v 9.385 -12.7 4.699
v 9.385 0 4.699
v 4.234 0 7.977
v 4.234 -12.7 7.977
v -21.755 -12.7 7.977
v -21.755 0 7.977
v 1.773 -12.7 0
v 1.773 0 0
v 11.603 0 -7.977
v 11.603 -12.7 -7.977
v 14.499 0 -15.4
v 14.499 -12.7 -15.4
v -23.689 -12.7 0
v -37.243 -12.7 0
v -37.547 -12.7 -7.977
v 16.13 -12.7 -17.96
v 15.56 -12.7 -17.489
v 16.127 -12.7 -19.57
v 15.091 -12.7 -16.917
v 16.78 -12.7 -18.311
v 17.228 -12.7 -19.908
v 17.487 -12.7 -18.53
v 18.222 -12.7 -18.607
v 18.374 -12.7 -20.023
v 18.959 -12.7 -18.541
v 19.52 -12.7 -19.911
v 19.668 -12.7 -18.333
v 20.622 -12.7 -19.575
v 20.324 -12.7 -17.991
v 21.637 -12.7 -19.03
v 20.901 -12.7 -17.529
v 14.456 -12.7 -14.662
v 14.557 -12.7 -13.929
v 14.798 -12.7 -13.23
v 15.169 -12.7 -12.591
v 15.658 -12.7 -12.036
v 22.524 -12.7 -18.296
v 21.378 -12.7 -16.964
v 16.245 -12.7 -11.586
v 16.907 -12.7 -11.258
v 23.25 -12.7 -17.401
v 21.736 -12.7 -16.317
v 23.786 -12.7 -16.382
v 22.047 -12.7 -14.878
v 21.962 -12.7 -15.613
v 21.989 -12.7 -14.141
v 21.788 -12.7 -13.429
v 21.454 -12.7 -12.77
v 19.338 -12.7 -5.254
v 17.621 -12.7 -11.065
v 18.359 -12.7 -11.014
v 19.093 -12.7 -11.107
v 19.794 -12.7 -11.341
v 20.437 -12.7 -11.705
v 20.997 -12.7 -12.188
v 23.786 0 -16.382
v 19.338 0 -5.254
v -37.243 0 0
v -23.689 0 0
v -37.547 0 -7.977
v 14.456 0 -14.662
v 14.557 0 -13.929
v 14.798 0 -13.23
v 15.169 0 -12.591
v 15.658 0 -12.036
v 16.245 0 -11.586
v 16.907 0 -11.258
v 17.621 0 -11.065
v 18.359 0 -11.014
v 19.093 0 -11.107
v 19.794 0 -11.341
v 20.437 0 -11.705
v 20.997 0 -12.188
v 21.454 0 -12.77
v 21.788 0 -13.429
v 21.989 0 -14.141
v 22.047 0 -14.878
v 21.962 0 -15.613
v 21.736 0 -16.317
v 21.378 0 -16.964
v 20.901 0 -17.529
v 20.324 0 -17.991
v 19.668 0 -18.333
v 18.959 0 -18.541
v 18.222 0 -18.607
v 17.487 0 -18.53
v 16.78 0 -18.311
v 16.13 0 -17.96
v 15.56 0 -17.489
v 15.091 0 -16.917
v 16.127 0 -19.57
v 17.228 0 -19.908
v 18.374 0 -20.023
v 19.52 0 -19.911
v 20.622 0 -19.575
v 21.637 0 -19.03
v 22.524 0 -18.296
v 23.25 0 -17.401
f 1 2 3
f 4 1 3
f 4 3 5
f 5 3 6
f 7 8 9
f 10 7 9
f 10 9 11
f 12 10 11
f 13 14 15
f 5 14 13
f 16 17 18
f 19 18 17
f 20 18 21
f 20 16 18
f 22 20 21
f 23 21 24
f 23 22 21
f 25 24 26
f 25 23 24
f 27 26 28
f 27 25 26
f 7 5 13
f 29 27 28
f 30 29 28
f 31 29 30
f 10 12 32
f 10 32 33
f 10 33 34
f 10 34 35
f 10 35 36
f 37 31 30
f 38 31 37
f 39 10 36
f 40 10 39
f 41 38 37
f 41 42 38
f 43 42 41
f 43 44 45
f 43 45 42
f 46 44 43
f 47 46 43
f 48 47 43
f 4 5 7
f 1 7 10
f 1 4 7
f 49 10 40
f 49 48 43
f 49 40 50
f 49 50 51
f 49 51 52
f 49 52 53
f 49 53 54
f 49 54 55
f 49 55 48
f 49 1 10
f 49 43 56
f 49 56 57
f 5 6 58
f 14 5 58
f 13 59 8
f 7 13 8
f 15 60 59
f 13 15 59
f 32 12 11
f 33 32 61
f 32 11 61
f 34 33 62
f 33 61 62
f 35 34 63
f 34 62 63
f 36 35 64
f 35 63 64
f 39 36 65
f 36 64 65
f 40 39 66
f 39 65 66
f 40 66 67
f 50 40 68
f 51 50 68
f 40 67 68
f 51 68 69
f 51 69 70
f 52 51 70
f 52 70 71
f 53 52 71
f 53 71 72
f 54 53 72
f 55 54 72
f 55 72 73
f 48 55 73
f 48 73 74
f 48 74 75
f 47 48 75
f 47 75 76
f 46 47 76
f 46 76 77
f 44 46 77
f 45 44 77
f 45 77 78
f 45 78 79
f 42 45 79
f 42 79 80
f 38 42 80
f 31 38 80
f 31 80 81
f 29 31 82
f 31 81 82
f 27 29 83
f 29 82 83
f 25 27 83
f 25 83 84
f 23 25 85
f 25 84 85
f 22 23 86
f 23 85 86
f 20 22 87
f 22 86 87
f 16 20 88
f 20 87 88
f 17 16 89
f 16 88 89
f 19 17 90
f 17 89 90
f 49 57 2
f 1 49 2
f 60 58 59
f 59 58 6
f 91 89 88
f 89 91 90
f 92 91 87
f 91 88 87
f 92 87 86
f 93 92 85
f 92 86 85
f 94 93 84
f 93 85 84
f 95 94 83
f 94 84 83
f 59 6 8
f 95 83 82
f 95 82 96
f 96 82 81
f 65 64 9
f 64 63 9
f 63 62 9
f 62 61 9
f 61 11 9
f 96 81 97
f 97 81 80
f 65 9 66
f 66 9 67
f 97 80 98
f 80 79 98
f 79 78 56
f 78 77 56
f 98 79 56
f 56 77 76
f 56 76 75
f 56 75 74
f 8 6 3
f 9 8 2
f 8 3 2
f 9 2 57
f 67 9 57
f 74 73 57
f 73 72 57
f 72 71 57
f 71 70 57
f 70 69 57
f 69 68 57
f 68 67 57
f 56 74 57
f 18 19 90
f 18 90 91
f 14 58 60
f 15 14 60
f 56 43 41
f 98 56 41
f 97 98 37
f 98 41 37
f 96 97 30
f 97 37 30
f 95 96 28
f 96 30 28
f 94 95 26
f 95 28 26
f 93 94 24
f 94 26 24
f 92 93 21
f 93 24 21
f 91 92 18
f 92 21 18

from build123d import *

# Parameters (mm, degrees)
F1_DEPTH = 12.7
F3_D     = 7.5946
F5_DEPTH = 25.4


with BuildPart() as f1:
    # F0 (on Front) → F1 (new body)
    with BuildSketch(Plane.XZ):
        Polygon((-23.688762, 0), (-1.933777, 0), (1.772629, 0), (11.602659, -7.976828), (19.337766, -27.798036), (23.608761, -21.086473), (24.058953, -17.065071), (19.337766, -5.253581), (9.385022, 4.699161), (4.234401, 7.976828), (-21.754986, 7.976828), (-37.24273, 0), (-37.547495, -7.976828), align=None)
    extrude(amount=F1_DEPTH)

    # F3 (through all)
    with Locations(Plane.XZ.offset(12.7)):
        with Locations((18.250674, -14.809974)):
            Hole(F3_D / 2)

    # F4 (on face) → F5 (cut)
    with BuildSketch(Plane.XZ.offset(12.7)):
        with BuildLine():
            ThreePointArc((23.785793, -16.381676), (20.622019, -19.575228), (16.126665, -19.569593))
            Line((16.126665, -19.569593), (19.337766, -27.798036))
            Line((19.337766, -27.798036), (23.608761, -21.086473))
            Line((23.608761, -21.086473), (24.058953, -17.065071))
            Line((24.058953, -17.065071), (23.785793, -16.381676))
        make_face()
    extrude(amount=-F5_DEPTH, mode=Mode.SUBTRACT)


solid = f1.part
